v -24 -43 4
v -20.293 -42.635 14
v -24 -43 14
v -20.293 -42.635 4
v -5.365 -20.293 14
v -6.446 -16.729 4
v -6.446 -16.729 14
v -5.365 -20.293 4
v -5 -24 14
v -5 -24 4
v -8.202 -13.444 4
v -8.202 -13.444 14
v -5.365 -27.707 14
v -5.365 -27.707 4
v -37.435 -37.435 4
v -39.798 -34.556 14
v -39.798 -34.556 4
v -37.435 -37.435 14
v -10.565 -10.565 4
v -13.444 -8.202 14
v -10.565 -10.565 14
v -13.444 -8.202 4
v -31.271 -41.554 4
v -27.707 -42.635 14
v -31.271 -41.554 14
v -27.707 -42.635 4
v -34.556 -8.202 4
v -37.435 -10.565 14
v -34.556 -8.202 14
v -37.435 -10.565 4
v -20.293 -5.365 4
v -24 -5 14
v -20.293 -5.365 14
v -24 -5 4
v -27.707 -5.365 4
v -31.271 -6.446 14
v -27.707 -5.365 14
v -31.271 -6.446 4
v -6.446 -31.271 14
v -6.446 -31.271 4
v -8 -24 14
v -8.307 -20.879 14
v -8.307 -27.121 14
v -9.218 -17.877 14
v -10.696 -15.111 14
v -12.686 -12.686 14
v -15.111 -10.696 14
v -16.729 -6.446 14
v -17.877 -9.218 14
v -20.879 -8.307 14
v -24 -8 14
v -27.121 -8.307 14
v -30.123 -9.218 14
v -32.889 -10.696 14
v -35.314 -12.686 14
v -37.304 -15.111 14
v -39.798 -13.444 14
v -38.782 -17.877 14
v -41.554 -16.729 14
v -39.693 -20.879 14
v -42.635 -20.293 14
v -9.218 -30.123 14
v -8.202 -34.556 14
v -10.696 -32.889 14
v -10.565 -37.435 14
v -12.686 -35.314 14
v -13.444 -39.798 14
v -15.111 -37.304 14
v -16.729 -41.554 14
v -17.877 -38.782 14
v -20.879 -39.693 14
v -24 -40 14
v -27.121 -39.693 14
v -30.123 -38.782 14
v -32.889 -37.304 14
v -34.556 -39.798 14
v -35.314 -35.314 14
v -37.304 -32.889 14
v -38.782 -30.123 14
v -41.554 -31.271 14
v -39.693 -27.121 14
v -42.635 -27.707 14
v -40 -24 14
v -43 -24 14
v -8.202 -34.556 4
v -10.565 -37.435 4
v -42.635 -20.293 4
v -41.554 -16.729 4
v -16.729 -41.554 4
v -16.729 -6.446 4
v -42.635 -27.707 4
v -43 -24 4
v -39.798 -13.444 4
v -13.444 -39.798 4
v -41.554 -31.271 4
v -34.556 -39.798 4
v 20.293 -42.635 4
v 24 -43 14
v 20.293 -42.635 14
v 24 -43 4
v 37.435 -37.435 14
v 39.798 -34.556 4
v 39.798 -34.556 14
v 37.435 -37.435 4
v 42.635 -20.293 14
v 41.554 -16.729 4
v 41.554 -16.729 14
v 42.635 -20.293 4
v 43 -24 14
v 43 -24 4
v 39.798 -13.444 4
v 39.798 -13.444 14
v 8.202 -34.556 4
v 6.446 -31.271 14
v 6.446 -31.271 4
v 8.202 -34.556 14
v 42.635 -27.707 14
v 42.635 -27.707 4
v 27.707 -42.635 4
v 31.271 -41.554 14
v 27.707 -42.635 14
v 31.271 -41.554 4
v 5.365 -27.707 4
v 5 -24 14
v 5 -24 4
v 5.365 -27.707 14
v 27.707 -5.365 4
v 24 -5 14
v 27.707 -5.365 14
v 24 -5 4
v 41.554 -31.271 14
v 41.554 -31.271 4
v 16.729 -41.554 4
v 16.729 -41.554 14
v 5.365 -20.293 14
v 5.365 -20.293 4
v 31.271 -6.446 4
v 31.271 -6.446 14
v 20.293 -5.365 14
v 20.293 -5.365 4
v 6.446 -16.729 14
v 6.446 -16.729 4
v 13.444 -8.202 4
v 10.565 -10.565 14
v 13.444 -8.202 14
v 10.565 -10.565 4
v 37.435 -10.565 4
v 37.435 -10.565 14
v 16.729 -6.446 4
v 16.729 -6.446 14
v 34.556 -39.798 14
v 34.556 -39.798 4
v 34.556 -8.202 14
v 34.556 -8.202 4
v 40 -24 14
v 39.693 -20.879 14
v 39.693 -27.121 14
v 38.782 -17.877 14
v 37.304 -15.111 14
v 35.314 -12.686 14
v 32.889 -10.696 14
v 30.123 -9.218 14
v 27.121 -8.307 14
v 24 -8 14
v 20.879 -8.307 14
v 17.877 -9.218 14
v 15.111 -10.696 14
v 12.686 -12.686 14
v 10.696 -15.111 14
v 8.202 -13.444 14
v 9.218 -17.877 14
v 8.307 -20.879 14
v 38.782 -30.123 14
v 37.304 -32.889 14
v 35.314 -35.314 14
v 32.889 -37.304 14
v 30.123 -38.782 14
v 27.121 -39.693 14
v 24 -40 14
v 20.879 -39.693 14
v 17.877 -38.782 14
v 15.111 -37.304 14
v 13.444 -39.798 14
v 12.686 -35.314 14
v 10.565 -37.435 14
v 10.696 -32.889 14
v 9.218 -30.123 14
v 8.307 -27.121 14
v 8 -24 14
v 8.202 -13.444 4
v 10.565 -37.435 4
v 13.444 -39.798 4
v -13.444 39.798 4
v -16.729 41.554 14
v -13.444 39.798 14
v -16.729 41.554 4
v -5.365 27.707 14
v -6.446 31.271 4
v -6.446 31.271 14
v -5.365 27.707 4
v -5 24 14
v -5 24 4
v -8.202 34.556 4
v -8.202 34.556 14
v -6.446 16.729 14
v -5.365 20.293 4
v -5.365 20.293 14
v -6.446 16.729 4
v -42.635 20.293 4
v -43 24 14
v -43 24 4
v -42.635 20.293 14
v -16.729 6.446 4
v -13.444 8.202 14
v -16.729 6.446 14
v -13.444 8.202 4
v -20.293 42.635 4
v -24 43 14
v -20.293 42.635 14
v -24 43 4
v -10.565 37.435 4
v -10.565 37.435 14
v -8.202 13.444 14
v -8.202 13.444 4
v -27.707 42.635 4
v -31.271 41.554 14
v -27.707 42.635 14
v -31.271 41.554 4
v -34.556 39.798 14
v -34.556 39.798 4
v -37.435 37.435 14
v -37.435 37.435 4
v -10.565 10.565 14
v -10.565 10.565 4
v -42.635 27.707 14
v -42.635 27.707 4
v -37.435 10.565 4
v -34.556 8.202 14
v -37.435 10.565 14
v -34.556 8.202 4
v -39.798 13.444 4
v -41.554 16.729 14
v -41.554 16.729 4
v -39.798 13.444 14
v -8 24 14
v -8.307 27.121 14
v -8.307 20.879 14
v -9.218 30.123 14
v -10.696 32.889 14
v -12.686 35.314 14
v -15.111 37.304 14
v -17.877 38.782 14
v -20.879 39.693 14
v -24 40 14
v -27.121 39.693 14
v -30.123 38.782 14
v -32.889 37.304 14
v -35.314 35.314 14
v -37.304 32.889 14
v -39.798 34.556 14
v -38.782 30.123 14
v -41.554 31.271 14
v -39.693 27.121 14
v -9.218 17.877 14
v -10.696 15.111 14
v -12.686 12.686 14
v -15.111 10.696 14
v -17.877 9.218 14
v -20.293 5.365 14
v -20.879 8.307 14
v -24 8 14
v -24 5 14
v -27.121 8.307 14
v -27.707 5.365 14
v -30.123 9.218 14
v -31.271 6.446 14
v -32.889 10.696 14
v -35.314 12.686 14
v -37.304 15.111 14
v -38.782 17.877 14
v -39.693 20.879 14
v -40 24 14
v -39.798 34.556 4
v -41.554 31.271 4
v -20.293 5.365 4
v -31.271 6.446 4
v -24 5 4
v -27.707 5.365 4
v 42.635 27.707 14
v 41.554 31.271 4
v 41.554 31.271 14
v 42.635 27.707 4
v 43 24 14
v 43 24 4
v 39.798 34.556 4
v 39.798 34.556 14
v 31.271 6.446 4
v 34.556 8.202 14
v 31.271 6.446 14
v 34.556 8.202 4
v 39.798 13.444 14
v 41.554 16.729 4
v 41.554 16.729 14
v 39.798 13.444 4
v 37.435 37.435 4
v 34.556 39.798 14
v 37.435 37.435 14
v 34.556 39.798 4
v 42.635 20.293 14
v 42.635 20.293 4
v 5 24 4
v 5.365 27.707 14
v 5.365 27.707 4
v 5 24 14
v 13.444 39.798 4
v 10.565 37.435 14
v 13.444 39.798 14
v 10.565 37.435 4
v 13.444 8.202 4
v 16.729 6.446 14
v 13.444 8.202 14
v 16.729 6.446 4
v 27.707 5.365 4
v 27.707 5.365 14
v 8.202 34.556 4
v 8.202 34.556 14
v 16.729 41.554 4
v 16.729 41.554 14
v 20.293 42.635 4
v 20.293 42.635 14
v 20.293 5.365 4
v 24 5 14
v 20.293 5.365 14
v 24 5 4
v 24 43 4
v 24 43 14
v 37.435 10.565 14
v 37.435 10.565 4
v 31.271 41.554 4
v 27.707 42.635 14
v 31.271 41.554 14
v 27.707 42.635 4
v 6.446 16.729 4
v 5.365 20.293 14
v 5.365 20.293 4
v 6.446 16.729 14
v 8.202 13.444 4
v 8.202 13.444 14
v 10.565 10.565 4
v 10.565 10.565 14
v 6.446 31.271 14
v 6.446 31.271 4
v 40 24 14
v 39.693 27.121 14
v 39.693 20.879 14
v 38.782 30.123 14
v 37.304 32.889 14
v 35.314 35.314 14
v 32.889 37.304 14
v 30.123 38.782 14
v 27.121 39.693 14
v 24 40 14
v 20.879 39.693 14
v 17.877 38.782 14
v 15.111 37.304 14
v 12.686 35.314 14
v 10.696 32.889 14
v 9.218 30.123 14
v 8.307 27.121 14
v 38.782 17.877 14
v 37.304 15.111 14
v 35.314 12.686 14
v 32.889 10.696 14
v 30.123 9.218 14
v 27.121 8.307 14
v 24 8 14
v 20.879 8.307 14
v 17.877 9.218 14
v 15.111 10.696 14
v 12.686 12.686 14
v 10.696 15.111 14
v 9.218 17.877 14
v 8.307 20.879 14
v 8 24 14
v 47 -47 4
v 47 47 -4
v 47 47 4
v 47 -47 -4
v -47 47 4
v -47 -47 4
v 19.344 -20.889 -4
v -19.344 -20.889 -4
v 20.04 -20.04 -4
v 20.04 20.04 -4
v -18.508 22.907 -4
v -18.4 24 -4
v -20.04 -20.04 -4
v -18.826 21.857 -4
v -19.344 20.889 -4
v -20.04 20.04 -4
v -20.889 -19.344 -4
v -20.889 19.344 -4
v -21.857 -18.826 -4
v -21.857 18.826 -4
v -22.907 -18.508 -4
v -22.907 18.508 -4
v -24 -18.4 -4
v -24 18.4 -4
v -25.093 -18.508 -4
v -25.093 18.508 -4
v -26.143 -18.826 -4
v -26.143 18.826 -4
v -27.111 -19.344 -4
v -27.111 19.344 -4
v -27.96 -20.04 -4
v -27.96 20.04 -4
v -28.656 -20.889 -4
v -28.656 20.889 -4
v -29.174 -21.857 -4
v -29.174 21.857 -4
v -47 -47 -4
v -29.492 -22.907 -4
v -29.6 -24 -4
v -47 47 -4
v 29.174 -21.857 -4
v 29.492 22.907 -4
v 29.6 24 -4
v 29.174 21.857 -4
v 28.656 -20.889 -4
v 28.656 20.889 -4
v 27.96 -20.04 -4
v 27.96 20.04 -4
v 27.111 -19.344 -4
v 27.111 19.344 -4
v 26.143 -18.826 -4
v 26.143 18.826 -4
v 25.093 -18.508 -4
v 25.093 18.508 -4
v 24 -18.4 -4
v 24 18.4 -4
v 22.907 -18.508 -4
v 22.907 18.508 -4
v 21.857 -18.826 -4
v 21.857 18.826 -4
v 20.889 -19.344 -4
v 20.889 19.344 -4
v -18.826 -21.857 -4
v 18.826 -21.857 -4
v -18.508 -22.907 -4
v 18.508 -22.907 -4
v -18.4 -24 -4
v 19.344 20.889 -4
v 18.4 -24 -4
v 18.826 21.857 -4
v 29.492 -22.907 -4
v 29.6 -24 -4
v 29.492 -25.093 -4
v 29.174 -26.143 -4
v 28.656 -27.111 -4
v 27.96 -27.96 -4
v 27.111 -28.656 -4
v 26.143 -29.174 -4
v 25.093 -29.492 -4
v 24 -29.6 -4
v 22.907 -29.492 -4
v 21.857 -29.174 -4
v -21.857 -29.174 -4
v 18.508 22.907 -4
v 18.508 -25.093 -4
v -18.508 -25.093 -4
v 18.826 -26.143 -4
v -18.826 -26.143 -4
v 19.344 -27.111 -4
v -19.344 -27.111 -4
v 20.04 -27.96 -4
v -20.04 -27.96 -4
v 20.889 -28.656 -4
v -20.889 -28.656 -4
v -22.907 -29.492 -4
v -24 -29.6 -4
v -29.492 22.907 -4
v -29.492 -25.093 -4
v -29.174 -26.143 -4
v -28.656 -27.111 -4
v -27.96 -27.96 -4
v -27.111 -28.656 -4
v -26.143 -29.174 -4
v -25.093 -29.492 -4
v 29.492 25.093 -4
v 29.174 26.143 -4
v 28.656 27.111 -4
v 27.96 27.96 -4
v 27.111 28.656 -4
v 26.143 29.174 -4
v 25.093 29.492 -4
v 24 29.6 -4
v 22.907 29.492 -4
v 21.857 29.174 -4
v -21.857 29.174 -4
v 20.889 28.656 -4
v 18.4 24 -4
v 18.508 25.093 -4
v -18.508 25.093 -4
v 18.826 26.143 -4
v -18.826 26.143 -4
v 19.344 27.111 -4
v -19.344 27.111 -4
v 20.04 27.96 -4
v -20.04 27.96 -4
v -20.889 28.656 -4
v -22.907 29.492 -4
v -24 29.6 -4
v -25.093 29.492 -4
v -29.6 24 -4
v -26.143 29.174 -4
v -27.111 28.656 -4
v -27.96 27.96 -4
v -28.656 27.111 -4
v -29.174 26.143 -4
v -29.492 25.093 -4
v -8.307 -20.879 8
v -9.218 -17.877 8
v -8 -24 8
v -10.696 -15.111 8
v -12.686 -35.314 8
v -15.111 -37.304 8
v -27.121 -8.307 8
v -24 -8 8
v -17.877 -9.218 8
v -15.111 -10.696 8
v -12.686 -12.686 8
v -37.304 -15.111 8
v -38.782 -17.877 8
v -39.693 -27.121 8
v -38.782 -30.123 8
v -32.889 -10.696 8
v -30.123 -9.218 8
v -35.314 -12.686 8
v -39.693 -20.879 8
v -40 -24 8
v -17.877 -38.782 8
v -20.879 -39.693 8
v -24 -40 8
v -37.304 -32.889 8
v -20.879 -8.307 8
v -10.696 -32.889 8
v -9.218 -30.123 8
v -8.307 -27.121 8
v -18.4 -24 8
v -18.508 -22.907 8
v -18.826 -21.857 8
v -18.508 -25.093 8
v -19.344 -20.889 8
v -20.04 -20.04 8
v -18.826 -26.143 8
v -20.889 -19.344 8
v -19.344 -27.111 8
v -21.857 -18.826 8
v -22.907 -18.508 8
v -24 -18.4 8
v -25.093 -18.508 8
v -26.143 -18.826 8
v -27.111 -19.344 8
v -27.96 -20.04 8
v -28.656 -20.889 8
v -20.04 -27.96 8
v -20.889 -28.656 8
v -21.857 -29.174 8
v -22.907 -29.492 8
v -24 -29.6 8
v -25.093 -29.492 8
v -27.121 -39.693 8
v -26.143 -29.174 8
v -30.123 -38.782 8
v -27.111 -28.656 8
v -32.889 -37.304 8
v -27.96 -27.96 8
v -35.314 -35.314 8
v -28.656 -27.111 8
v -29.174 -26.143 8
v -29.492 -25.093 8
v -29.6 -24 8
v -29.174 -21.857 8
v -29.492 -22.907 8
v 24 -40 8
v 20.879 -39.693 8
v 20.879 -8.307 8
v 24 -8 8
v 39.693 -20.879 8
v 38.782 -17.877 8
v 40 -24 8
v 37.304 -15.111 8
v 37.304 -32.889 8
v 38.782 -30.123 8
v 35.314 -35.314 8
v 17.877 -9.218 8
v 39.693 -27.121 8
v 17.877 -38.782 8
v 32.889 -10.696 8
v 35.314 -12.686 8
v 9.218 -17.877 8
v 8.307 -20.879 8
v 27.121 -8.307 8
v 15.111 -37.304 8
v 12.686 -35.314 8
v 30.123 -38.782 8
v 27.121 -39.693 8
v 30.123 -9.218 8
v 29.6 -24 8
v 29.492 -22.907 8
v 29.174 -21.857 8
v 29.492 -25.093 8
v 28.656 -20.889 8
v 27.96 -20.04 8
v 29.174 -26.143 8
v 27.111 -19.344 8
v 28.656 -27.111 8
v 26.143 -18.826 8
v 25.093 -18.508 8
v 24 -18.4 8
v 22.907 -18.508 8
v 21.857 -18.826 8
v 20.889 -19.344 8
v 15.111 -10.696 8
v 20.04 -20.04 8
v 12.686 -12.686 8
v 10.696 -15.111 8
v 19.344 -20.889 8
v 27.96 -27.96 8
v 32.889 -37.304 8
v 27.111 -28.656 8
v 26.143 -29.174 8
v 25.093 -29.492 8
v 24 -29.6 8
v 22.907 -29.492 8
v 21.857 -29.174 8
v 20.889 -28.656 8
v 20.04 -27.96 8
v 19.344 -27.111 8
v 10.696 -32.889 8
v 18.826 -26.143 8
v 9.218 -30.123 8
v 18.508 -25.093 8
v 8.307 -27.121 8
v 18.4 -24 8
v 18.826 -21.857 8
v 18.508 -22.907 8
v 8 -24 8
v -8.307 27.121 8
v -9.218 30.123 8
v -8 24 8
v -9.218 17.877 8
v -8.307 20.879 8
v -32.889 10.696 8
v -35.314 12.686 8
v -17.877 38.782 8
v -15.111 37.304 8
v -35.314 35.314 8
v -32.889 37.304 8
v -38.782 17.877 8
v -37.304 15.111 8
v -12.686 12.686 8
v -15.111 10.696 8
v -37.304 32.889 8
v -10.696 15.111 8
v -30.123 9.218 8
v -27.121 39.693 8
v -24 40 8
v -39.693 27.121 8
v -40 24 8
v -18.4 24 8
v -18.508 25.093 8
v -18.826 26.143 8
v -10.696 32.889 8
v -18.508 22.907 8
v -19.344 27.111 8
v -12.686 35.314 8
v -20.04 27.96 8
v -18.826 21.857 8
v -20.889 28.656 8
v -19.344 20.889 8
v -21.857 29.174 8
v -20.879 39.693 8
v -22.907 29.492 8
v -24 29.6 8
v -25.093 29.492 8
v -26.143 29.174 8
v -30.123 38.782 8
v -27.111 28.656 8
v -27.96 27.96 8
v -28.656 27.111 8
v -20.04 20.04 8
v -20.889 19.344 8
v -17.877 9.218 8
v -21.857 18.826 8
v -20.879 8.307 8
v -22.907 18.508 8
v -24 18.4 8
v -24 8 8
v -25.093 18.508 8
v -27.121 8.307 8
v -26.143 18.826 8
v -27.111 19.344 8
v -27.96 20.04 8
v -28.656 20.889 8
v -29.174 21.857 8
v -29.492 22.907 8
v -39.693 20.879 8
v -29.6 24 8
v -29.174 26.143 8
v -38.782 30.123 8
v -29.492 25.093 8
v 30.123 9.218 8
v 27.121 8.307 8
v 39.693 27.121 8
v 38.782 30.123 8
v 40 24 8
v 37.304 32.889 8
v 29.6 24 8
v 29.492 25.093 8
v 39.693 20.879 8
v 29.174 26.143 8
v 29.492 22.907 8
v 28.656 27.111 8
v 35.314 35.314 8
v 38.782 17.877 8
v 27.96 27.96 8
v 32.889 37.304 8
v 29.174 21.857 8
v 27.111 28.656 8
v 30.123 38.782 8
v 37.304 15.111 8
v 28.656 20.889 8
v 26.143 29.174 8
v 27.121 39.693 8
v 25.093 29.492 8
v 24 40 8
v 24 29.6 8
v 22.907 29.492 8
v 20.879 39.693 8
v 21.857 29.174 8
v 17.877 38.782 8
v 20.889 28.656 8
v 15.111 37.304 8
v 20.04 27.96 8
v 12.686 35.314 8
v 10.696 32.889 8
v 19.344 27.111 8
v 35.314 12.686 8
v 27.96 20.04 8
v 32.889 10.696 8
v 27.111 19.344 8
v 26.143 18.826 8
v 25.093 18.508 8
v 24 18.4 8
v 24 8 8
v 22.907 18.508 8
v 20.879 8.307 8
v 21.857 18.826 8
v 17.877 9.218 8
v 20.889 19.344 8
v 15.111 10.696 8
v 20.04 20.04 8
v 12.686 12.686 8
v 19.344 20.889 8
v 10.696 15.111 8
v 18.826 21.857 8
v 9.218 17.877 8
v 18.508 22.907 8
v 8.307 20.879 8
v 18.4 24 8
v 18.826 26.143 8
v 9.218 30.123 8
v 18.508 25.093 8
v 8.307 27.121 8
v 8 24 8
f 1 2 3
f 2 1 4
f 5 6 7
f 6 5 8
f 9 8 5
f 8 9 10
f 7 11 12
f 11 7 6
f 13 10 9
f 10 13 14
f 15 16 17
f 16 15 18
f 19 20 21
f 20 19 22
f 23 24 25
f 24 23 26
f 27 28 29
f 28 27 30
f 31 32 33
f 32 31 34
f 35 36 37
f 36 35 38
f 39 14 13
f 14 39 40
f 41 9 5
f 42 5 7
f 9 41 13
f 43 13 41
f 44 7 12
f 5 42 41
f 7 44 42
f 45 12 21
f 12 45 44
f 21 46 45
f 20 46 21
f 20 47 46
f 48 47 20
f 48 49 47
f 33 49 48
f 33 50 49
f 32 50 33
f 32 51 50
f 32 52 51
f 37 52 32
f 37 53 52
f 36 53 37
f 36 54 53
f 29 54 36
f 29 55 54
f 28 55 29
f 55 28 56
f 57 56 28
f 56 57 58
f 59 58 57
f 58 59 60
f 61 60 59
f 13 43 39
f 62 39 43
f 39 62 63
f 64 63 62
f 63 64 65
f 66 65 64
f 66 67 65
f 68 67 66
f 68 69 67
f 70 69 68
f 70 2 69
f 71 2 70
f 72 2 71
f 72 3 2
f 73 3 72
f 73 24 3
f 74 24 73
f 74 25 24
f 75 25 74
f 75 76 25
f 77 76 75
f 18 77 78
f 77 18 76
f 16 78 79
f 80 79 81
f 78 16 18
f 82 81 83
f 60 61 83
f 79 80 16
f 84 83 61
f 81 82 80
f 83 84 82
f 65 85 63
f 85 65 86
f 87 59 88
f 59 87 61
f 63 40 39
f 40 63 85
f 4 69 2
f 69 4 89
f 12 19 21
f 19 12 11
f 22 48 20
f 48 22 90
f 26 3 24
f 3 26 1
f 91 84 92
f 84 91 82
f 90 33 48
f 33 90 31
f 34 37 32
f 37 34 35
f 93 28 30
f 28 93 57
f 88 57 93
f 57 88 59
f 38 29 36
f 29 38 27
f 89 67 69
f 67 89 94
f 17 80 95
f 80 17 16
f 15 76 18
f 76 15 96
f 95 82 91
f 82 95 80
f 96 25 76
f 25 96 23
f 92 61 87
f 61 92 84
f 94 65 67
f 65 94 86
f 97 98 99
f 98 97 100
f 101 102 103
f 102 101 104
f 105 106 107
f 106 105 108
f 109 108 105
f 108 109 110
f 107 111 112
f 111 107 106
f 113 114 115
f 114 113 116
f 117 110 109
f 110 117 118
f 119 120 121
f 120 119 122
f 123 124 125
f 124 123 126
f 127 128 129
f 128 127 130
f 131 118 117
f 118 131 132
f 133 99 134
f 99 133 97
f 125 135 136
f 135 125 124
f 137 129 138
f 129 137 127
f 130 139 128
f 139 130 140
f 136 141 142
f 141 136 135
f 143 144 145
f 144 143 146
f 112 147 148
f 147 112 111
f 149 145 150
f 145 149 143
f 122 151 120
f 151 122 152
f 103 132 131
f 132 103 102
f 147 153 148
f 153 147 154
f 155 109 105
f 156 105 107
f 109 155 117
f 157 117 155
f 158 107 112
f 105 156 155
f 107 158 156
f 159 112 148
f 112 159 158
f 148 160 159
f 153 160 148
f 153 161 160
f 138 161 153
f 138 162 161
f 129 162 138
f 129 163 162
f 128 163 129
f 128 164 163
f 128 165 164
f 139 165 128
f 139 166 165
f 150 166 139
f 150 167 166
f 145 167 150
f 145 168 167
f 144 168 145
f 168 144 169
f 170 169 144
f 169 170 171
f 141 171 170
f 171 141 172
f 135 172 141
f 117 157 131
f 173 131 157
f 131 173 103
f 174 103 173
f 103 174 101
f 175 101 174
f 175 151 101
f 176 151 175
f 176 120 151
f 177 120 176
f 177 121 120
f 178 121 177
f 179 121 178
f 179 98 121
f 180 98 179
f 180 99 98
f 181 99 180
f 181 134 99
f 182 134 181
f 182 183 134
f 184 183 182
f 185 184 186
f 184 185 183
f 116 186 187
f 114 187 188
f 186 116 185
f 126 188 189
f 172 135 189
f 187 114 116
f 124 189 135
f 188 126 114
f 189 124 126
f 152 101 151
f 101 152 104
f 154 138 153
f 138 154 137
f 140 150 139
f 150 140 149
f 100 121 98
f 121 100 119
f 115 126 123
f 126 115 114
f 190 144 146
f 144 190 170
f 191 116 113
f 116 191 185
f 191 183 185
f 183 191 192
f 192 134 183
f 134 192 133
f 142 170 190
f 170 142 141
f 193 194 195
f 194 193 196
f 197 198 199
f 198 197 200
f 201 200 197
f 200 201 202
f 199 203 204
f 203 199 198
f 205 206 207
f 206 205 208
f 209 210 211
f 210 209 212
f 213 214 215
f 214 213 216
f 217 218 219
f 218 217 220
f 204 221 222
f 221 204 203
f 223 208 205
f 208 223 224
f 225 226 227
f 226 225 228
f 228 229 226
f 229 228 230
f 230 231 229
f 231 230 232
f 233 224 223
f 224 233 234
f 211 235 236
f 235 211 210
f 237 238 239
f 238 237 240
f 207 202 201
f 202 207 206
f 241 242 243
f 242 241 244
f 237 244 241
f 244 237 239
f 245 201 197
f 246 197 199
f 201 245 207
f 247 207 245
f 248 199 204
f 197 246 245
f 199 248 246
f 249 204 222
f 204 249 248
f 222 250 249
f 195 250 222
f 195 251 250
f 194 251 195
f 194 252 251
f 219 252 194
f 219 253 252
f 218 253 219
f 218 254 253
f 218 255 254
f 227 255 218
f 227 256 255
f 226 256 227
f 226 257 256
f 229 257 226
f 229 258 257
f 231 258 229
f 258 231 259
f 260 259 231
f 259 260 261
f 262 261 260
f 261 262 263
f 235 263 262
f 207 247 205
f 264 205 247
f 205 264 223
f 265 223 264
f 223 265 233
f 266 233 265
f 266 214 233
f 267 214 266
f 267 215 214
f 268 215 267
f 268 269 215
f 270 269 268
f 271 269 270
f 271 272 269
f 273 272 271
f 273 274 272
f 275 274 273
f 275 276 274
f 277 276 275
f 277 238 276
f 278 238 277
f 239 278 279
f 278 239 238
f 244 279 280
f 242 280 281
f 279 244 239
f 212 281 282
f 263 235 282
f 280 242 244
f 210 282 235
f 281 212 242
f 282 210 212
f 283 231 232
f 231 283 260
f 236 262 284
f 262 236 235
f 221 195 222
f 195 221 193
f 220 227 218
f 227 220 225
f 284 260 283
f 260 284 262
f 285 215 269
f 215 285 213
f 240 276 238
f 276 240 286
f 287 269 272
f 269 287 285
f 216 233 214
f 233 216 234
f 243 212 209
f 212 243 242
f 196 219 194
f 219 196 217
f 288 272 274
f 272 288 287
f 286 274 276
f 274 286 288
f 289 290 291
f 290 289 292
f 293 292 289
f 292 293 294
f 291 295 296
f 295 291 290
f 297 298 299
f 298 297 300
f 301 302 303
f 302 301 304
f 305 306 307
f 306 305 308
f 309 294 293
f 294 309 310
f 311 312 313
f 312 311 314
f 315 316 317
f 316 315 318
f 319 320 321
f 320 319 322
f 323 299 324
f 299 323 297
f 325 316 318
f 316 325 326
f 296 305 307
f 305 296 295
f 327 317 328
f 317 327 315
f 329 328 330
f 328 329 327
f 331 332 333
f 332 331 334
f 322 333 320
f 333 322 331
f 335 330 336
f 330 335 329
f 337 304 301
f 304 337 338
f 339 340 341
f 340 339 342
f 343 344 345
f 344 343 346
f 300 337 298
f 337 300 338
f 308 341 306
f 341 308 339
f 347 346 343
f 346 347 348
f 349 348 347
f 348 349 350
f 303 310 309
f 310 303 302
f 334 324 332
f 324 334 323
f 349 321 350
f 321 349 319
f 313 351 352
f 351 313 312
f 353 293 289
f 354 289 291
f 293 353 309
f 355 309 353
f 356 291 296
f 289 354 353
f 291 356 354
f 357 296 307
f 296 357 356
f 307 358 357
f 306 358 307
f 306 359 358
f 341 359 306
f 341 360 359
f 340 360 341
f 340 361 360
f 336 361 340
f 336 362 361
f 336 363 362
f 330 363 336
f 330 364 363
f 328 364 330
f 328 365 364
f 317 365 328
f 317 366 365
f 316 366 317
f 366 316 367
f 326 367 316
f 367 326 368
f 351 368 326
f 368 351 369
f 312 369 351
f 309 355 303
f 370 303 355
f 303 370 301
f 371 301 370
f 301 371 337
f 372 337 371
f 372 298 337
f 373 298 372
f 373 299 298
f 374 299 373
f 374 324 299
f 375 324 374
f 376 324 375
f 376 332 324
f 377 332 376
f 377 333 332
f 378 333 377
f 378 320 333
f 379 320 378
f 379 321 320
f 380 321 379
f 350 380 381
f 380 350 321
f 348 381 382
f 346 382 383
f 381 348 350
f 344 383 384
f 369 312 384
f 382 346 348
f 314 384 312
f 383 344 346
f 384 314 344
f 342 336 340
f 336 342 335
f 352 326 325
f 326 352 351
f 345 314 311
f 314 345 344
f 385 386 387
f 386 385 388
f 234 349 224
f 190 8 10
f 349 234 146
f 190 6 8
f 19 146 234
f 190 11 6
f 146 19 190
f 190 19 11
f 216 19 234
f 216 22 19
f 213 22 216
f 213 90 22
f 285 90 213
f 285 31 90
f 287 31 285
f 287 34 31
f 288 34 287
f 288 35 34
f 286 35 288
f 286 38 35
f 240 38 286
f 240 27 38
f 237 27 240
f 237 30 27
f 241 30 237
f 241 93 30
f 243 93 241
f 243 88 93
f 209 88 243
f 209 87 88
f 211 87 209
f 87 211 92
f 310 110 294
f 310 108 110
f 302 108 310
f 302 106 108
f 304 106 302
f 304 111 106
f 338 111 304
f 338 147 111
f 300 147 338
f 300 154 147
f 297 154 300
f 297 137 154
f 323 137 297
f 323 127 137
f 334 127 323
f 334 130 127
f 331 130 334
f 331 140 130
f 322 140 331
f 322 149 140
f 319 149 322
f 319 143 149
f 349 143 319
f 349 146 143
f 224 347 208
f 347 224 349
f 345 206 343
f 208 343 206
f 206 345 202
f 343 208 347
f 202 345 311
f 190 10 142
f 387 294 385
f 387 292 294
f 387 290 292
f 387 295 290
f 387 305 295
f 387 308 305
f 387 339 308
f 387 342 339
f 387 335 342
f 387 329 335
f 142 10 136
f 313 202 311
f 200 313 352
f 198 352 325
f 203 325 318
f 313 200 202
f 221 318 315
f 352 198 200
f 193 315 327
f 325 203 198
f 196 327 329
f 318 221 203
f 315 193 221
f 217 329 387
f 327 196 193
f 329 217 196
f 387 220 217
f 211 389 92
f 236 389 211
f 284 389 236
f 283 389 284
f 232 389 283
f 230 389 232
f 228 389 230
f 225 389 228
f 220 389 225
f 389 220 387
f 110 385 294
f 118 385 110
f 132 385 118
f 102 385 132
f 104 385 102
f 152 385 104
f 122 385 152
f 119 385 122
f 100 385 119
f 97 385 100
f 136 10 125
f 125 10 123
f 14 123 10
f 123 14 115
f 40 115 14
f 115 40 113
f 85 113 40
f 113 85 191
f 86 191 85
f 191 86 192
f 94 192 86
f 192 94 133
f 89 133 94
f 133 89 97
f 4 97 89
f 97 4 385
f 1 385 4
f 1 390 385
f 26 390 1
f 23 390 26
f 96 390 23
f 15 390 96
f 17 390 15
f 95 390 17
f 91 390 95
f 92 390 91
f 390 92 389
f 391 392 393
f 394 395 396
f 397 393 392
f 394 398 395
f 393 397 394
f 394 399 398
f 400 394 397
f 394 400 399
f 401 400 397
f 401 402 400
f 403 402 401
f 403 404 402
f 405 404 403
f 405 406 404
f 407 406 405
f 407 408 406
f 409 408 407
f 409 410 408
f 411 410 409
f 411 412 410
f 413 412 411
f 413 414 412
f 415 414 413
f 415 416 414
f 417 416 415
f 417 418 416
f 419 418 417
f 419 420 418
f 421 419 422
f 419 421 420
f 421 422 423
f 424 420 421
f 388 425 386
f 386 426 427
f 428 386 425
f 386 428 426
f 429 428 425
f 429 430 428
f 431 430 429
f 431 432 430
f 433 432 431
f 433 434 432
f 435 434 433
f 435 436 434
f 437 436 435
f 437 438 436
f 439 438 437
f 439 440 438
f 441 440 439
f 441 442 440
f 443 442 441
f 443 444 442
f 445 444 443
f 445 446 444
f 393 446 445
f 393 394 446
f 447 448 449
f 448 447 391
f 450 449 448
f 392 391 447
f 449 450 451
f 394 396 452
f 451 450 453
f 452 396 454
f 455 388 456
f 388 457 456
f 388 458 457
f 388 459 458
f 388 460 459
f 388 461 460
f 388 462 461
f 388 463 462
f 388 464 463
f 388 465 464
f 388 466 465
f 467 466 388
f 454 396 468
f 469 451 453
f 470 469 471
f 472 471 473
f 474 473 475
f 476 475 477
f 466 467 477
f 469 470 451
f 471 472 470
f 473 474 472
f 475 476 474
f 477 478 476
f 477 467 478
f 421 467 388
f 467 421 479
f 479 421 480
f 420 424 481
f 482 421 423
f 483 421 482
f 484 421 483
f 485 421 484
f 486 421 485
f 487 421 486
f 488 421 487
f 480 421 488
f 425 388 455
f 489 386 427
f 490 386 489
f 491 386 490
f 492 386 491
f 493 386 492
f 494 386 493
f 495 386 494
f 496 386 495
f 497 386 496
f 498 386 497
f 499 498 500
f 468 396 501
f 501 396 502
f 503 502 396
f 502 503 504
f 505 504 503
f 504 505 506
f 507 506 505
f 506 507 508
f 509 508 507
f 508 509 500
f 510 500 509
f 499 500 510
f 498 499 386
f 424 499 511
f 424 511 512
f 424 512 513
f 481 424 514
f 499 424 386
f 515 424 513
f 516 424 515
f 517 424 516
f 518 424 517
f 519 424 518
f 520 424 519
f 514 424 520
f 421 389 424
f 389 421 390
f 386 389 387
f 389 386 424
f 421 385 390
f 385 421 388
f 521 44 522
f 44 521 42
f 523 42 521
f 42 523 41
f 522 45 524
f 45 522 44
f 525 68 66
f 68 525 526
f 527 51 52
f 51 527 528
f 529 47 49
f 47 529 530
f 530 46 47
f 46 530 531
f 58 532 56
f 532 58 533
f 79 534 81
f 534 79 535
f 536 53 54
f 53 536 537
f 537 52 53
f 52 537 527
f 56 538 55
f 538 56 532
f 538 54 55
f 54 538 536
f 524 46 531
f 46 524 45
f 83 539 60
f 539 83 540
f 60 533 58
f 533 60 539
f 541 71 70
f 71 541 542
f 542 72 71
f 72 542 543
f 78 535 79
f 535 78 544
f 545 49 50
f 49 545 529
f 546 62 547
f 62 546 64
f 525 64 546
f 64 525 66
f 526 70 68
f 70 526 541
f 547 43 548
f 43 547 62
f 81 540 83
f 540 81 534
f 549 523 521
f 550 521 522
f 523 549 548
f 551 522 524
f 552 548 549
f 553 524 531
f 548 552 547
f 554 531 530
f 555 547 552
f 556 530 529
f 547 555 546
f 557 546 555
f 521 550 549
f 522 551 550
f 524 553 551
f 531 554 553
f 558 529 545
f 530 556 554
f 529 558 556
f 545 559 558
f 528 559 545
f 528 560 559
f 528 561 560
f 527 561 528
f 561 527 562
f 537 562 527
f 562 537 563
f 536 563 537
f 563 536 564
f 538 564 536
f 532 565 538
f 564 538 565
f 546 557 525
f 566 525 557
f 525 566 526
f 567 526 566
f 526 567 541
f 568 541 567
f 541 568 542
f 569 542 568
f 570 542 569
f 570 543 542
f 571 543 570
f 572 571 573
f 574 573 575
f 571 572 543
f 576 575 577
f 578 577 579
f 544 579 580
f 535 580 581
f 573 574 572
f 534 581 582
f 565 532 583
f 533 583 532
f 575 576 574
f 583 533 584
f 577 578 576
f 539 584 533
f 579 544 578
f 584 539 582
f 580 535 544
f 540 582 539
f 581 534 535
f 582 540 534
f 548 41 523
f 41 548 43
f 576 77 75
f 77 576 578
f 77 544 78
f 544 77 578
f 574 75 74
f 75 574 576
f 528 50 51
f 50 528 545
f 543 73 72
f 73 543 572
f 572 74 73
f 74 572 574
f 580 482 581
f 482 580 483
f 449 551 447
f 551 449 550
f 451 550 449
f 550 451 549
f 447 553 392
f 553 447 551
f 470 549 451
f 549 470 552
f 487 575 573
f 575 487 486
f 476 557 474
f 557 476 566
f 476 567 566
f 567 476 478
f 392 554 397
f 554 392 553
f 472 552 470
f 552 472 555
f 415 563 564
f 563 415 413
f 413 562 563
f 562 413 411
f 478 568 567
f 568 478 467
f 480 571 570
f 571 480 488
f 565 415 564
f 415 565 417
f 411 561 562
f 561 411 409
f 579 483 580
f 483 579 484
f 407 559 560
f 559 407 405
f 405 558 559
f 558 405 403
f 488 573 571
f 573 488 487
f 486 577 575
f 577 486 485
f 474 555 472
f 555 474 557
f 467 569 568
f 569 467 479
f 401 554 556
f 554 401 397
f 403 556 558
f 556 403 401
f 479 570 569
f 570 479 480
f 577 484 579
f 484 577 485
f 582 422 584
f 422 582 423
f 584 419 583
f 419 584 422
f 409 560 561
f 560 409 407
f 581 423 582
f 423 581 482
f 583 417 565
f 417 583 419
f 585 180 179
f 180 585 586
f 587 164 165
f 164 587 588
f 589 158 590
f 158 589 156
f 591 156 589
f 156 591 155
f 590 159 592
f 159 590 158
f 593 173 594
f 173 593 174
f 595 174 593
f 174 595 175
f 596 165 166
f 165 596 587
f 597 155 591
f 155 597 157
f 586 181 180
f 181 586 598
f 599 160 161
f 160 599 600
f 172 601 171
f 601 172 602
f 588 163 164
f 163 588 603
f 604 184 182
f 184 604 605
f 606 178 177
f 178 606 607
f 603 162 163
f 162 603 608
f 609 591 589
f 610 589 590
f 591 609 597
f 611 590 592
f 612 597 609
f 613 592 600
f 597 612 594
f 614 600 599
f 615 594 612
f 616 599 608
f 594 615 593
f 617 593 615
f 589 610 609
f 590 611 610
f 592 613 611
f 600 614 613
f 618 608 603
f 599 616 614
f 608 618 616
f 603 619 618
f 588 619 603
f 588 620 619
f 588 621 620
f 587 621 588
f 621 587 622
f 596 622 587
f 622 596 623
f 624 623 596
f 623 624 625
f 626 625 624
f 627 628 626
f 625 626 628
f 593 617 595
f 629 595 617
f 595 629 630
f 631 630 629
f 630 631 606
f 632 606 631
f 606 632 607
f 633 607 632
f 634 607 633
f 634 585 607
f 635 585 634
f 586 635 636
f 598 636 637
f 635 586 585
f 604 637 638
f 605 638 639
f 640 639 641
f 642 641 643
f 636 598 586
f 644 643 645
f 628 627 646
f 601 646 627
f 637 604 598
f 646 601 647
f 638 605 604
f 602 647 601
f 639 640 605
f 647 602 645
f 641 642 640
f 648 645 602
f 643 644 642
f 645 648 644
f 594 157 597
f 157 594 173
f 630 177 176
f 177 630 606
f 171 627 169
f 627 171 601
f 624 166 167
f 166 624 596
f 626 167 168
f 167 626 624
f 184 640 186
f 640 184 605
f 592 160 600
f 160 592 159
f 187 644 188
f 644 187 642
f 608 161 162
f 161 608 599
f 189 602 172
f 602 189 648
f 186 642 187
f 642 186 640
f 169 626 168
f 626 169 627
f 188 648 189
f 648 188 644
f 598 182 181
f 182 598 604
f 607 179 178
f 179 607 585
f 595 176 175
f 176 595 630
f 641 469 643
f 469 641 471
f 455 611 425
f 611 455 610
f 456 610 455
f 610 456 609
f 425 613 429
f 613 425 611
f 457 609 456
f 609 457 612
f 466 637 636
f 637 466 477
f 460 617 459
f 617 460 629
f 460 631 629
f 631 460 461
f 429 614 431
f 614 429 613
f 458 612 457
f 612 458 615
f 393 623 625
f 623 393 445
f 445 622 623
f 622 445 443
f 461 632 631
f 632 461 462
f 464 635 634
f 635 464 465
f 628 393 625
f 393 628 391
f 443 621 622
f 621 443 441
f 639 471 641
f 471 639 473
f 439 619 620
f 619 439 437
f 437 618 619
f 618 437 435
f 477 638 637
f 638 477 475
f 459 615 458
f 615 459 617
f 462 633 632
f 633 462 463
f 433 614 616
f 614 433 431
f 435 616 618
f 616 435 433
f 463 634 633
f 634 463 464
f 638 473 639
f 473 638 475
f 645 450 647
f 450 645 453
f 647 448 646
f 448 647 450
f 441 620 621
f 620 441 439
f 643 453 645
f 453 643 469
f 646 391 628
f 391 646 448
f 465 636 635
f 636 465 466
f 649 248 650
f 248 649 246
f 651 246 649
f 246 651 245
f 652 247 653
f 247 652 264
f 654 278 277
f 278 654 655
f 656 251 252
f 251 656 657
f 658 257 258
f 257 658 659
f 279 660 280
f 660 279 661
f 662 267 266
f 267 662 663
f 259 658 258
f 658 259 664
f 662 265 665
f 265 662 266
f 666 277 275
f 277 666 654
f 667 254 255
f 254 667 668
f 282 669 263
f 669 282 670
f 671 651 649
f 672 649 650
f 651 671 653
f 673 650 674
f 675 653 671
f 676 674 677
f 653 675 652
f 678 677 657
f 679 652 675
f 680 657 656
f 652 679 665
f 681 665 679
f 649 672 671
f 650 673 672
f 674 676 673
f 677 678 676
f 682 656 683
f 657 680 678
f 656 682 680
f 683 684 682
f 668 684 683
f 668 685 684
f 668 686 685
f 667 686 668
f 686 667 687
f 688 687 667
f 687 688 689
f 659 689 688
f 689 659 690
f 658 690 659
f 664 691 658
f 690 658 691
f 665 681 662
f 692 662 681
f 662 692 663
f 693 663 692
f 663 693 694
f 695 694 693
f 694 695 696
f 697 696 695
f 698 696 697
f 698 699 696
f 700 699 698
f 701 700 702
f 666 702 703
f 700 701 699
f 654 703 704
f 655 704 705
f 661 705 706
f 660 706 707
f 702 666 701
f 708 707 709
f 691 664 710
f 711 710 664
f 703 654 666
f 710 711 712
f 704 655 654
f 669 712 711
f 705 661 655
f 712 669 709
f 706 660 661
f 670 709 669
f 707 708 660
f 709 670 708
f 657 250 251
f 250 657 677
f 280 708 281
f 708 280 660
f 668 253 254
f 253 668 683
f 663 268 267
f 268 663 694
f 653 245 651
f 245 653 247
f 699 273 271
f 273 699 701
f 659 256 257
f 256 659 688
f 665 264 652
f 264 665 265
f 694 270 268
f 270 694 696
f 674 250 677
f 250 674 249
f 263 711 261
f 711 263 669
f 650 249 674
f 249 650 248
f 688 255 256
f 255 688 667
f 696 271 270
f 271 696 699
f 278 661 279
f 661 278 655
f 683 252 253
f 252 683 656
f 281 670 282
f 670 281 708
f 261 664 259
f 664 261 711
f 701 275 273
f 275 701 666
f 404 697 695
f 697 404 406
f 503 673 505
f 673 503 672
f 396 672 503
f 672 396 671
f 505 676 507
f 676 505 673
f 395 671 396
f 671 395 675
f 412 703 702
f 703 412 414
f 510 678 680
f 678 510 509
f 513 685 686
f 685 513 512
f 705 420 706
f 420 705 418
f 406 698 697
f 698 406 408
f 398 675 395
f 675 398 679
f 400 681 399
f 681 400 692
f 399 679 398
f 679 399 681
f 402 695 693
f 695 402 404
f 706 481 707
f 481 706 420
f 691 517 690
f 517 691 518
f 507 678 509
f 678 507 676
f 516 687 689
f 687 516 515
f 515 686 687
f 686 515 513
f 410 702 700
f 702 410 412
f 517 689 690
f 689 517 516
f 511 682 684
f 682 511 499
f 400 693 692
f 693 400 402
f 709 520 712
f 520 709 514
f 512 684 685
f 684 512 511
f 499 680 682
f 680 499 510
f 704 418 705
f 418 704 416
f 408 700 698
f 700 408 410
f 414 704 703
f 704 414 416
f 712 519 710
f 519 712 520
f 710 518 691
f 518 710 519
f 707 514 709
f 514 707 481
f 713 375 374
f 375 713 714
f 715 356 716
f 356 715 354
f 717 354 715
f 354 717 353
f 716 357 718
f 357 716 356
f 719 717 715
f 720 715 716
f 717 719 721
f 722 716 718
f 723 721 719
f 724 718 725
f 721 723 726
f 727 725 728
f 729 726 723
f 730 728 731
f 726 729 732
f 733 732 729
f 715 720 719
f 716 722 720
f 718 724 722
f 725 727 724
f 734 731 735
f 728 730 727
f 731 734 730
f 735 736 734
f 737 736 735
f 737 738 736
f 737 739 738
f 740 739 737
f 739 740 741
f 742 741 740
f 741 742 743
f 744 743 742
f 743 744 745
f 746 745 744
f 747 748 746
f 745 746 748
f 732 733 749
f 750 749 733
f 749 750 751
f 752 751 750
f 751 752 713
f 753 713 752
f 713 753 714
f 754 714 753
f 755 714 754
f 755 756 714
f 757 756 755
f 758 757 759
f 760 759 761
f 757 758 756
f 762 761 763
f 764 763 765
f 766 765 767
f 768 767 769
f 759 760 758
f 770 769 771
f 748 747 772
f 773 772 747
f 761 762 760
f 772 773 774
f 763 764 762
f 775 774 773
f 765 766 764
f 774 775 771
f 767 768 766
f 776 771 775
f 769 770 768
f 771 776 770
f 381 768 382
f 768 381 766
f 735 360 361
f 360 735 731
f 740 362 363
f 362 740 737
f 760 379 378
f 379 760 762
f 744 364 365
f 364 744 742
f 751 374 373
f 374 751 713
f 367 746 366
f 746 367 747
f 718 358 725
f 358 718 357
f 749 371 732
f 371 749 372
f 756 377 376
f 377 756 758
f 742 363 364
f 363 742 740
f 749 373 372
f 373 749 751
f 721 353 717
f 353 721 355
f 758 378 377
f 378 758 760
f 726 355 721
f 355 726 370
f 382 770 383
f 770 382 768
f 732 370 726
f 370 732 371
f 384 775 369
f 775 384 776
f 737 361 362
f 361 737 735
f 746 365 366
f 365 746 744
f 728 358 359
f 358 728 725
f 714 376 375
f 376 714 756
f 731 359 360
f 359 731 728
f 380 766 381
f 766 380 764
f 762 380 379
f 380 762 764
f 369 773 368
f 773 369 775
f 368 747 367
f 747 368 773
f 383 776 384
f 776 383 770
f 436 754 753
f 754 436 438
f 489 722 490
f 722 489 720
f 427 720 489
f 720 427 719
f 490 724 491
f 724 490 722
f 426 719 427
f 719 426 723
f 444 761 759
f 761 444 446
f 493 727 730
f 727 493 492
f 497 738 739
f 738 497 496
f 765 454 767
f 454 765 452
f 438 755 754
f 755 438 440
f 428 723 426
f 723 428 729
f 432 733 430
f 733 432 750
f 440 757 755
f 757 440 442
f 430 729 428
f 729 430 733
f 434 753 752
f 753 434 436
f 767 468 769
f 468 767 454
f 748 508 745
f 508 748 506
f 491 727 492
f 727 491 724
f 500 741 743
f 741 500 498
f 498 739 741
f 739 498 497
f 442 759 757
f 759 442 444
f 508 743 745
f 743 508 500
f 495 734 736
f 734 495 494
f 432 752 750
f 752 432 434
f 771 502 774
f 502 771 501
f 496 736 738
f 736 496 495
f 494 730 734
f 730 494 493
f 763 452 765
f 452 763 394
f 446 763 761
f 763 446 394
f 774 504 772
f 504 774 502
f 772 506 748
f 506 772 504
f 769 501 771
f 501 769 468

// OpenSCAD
$fn = 32;

// ----------------------------------------------------------------------
// Socket pad plate
// bosses with counterbored sockets for the screws
// ----------------------------------------------------------------------

// --- parameters (mm) ---
base_t = 8;        // base plate thickness
boss_h = 10;       // boss height above the base plate
boss_d = 38;       // boss diameter
socket_d = 32;     // socket diameter
socket_depth = 6;  // socket depth from the boss face
bolt_d = 11.2;     // screw clearance hole through the socket floor
rows = 2;          // boss rows
cols = 2;          // bosses per row
pitch = 48;        // boss pitch

// --- derived feature positions (mm) ---
height = base_t + boss_h;           // = 18   overall height of the part
plate = [pitch * (cols - 1) + boss_d + 8, pitch * (rows - 1) + boss_d + 8, base_t];  // = [94, 94, 8]   overall size (x, y, z)
span_x = pitch * (cols - 1);        // = 48   distance between outer bosses
span_y = pitch * (rows - 1);        // = 48   distance between boss rows
origin_x = -span_x / 2;             // = -24   X of the first boss
origin_y = -span_y / 2;             // = -24   Y of the first boss
feature_centers = [
  [origin_x + 0 * pitch, origin_y + 0 * pitch],
  [origin_x + 1 * pitch, origin_y + 0 * pitch],
  [origin_x + 0 * pitch, origin_y + 1 * pitch],
  [origin_x + 1 * pitch, origin_y + 1 * pitch]
];   // boss centres: sockets, holes and the pads themselves are placed from here

// base plate, bosses on feature_centers, socket + through hole in each
difference() {
  union() {
    cube(plate, center = true);
    for (centre = feature_centers)
      translate([centre[0], centre[1], plate[2] / 2 - 1])
        cylinder(d = boss_d, h = boss_h + 1);
  }
  for (centre = feature_centers) {
    translate([centre[0], centre[1], plate[2] / 2 + boss_h - socket_depth])
      cylinder(d = socket_d, h = socket_depth + 1);
    translate([centre[0], centre[1], -height])
      cylinder(d = bolt_d, h = 2 * height + 2);  // through the socket floor
  }
}
